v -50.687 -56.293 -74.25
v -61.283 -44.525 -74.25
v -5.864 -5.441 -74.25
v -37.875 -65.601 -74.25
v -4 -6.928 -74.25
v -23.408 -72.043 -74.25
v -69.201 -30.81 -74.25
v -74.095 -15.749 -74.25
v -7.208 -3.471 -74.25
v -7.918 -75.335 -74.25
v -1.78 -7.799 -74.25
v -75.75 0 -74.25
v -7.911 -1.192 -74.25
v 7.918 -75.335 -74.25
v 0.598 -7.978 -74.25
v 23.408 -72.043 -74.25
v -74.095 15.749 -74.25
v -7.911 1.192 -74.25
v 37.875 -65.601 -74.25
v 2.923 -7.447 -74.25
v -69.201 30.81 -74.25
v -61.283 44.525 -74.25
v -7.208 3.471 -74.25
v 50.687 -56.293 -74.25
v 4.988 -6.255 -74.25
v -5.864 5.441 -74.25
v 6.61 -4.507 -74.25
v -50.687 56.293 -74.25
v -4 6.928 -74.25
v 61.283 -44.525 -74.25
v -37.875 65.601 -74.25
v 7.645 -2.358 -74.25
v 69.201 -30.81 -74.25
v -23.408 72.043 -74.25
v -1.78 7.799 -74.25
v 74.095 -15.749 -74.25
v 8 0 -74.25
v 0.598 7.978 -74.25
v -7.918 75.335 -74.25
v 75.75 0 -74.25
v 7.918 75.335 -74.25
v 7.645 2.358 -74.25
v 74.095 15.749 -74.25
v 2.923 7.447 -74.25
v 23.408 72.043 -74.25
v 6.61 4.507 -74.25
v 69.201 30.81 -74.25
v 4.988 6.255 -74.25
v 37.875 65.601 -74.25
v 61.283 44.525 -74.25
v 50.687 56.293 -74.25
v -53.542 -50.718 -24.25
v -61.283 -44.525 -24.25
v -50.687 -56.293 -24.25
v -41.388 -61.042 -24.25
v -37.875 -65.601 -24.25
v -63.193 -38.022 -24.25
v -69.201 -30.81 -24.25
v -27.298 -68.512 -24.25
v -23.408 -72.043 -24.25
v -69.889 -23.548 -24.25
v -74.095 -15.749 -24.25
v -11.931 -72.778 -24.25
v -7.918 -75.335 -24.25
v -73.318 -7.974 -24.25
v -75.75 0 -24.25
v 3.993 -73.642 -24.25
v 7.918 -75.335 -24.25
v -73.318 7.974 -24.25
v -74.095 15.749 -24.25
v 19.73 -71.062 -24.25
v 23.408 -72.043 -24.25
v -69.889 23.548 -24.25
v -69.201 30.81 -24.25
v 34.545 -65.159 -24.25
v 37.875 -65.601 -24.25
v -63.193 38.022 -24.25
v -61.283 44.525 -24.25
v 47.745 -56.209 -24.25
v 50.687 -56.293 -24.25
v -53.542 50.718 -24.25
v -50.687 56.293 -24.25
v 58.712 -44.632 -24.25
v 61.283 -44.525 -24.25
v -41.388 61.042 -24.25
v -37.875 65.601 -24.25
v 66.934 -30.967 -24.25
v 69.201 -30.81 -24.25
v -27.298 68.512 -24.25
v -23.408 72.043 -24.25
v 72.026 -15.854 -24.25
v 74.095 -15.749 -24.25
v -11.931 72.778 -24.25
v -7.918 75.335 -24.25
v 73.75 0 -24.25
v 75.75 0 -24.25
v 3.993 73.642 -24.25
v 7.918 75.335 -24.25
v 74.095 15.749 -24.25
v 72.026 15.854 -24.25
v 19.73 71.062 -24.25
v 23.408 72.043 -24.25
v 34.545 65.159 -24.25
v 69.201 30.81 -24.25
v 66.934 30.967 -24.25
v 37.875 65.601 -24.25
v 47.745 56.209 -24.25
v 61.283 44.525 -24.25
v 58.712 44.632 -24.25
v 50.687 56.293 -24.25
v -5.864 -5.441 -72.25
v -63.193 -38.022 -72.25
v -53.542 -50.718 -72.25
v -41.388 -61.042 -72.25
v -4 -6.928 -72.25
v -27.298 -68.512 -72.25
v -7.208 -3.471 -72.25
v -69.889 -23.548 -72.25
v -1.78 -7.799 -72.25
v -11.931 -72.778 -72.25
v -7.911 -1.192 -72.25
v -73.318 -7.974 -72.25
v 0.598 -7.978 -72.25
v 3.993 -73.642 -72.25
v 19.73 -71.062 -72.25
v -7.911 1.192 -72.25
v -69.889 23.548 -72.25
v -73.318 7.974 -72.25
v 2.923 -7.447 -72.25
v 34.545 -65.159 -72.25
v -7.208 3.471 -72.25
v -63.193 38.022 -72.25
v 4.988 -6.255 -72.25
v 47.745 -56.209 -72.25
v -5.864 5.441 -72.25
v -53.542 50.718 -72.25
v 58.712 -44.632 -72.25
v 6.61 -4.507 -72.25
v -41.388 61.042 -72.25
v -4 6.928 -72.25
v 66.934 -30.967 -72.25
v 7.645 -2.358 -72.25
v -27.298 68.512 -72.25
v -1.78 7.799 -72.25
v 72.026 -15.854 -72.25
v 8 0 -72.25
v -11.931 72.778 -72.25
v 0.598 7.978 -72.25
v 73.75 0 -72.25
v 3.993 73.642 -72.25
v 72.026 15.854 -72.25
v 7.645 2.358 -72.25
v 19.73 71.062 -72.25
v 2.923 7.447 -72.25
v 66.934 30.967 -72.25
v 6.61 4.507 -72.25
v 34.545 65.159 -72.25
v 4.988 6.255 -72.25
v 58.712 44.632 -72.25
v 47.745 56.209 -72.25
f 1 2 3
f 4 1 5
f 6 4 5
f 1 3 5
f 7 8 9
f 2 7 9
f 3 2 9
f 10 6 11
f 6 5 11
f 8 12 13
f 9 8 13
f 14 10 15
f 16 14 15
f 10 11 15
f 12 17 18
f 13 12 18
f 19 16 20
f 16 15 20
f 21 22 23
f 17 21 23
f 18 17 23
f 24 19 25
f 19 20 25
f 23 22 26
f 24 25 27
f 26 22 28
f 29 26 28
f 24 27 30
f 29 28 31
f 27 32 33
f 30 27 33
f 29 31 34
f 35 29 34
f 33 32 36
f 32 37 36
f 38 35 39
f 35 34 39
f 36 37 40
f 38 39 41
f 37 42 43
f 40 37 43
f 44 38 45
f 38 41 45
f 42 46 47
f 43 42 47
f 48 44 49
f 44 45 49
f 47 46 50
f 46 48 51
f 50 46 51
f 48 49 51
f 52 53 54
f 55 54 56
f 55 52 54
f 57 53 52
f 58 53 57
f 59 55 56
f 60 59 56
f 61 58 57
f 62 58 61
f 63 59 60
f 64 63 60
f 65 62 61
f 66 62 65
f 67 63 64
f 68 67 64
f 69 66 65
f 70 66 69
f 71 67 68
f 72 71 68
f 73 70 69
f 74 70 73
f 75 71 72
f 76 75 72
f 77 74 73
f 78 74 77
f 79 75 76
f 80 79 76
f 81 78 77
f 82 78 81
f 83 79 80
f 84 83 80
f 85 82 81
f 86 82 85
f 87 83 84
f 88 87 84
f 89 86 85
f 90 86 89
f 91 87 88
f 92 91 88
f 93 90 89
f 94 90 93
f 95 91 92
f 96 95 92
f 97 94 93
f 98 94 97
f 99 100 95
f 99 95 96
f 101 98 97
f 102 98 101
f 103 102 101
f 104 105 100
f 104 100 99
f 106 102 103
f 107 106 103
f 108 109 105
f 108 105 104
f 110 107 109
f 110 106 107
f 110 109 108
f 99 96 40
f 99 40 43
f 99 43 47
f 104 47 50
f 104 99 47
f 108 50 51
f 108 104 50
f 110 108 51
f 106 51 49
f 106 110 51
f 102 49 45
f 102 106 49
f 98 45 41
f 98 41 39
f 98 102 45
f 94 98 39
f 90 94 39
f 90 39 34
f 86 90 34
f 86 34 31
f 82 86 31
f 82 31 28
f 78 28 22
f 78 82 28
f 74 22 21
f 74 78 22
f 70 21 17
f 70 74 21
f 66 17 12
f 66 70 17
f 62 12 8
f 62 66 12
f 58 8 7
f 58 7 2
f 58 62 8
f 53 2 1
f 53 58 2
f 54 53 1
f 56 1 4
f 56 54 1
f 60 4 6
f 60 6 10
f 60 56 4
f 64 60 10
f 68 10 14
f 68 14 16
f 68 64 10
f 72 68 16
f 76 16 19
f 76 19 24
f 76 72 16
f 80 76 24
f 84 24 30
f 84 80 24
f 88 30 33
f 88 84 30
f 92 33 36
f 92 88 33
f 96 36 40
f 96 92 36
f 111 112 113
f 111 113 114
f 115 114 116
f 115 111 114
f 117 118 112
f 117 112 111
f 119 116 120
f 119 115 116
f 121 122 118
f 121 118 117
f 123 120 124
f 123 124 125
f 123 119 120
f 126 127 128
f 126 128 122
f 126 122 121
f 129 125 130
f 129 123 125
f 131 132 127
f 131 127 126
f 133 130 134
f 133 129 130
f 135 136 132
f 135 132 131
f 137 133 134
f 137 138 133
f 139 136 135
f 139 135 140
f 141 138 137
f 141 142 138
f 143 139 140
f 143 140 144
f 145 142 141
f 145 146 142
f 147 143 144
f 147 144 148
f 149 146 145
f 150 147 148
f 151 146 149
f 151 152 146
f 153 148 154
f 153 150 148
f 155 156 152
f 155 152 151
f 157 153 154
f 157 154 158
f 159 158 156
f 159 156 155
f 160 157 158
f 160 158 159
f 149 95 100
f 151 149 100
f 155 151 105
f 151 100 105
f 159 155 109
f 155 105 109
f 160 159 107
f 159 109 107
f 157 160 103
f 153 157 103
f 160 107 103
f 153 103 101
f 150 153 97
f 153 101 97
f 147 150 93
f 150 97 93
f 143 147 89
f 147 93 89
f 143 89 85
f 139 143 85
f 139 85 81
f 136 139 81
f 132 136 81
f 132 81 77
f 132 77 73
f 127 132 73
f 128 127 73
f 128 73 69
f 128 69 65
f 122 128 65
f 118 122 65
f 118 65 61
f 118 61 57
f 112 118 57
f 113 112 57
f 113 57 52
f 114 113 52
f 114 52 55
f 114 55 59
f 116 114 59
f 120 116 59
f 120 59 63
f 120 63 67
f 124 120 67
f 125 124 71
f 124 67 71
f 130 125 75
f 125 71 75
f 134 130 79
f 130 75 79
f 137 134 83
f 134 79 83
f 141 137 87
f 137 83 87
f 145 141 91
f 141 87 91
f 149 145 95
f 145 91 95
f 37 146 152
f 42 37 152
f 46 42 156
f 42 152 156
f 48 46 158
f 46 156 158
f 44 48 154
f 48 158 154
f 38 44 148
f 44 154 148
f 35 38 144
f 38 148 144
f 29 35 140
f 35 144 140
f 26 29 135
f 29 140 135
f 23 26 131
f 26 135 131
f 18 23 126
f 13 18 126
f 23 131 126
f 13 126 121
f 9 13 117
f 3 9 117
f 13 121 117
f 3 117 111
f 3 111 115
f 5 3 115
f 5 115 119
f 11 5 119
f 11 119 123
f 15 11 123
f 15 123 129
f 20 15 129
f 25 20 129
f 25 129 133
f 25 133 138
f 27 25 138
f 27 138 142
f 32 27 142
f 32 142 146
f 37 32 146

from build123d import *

# Parameters (mm, degrees)
SKETCH113_R     = 75.75
PAD051_DEPTH    = 50
THICKNESS001_T  = -2
SKETCH114_R     = 8
POCKET112_DEPTH = 2.001


with BuildPart() as part:
    # Sketch113 → Pad051 (new body)
    with BuildSketch(Plane.XY.offset(-30)):
        Circle(SKETCH113_R)
    extrude(amount=-PAD051_DEPTH)

    # Thickness001
    thickness001_openings = [part.faces().sort_by_distance(p)[0] for p in [
        (0, 0, -30),
    ]]
    offset(amount=THICKNESS001_T, openings=thickness001_openings)

    # Sketch114 (on Face5 of Thickness001) → Pocket112 (cut, through all)
    with BuildSketch(Plane.XY.offset(-78)):
        Circle(SKETCH114_R)
    extrude(amount=-POCKET112_DEPTH, mode=Mode.SUBTRACT)


with BuildPart() as part_1:
    # Body007 placement: moved
    add(part.part.moved(Location((0, 0, 5.75))))


solid = part_1.part
